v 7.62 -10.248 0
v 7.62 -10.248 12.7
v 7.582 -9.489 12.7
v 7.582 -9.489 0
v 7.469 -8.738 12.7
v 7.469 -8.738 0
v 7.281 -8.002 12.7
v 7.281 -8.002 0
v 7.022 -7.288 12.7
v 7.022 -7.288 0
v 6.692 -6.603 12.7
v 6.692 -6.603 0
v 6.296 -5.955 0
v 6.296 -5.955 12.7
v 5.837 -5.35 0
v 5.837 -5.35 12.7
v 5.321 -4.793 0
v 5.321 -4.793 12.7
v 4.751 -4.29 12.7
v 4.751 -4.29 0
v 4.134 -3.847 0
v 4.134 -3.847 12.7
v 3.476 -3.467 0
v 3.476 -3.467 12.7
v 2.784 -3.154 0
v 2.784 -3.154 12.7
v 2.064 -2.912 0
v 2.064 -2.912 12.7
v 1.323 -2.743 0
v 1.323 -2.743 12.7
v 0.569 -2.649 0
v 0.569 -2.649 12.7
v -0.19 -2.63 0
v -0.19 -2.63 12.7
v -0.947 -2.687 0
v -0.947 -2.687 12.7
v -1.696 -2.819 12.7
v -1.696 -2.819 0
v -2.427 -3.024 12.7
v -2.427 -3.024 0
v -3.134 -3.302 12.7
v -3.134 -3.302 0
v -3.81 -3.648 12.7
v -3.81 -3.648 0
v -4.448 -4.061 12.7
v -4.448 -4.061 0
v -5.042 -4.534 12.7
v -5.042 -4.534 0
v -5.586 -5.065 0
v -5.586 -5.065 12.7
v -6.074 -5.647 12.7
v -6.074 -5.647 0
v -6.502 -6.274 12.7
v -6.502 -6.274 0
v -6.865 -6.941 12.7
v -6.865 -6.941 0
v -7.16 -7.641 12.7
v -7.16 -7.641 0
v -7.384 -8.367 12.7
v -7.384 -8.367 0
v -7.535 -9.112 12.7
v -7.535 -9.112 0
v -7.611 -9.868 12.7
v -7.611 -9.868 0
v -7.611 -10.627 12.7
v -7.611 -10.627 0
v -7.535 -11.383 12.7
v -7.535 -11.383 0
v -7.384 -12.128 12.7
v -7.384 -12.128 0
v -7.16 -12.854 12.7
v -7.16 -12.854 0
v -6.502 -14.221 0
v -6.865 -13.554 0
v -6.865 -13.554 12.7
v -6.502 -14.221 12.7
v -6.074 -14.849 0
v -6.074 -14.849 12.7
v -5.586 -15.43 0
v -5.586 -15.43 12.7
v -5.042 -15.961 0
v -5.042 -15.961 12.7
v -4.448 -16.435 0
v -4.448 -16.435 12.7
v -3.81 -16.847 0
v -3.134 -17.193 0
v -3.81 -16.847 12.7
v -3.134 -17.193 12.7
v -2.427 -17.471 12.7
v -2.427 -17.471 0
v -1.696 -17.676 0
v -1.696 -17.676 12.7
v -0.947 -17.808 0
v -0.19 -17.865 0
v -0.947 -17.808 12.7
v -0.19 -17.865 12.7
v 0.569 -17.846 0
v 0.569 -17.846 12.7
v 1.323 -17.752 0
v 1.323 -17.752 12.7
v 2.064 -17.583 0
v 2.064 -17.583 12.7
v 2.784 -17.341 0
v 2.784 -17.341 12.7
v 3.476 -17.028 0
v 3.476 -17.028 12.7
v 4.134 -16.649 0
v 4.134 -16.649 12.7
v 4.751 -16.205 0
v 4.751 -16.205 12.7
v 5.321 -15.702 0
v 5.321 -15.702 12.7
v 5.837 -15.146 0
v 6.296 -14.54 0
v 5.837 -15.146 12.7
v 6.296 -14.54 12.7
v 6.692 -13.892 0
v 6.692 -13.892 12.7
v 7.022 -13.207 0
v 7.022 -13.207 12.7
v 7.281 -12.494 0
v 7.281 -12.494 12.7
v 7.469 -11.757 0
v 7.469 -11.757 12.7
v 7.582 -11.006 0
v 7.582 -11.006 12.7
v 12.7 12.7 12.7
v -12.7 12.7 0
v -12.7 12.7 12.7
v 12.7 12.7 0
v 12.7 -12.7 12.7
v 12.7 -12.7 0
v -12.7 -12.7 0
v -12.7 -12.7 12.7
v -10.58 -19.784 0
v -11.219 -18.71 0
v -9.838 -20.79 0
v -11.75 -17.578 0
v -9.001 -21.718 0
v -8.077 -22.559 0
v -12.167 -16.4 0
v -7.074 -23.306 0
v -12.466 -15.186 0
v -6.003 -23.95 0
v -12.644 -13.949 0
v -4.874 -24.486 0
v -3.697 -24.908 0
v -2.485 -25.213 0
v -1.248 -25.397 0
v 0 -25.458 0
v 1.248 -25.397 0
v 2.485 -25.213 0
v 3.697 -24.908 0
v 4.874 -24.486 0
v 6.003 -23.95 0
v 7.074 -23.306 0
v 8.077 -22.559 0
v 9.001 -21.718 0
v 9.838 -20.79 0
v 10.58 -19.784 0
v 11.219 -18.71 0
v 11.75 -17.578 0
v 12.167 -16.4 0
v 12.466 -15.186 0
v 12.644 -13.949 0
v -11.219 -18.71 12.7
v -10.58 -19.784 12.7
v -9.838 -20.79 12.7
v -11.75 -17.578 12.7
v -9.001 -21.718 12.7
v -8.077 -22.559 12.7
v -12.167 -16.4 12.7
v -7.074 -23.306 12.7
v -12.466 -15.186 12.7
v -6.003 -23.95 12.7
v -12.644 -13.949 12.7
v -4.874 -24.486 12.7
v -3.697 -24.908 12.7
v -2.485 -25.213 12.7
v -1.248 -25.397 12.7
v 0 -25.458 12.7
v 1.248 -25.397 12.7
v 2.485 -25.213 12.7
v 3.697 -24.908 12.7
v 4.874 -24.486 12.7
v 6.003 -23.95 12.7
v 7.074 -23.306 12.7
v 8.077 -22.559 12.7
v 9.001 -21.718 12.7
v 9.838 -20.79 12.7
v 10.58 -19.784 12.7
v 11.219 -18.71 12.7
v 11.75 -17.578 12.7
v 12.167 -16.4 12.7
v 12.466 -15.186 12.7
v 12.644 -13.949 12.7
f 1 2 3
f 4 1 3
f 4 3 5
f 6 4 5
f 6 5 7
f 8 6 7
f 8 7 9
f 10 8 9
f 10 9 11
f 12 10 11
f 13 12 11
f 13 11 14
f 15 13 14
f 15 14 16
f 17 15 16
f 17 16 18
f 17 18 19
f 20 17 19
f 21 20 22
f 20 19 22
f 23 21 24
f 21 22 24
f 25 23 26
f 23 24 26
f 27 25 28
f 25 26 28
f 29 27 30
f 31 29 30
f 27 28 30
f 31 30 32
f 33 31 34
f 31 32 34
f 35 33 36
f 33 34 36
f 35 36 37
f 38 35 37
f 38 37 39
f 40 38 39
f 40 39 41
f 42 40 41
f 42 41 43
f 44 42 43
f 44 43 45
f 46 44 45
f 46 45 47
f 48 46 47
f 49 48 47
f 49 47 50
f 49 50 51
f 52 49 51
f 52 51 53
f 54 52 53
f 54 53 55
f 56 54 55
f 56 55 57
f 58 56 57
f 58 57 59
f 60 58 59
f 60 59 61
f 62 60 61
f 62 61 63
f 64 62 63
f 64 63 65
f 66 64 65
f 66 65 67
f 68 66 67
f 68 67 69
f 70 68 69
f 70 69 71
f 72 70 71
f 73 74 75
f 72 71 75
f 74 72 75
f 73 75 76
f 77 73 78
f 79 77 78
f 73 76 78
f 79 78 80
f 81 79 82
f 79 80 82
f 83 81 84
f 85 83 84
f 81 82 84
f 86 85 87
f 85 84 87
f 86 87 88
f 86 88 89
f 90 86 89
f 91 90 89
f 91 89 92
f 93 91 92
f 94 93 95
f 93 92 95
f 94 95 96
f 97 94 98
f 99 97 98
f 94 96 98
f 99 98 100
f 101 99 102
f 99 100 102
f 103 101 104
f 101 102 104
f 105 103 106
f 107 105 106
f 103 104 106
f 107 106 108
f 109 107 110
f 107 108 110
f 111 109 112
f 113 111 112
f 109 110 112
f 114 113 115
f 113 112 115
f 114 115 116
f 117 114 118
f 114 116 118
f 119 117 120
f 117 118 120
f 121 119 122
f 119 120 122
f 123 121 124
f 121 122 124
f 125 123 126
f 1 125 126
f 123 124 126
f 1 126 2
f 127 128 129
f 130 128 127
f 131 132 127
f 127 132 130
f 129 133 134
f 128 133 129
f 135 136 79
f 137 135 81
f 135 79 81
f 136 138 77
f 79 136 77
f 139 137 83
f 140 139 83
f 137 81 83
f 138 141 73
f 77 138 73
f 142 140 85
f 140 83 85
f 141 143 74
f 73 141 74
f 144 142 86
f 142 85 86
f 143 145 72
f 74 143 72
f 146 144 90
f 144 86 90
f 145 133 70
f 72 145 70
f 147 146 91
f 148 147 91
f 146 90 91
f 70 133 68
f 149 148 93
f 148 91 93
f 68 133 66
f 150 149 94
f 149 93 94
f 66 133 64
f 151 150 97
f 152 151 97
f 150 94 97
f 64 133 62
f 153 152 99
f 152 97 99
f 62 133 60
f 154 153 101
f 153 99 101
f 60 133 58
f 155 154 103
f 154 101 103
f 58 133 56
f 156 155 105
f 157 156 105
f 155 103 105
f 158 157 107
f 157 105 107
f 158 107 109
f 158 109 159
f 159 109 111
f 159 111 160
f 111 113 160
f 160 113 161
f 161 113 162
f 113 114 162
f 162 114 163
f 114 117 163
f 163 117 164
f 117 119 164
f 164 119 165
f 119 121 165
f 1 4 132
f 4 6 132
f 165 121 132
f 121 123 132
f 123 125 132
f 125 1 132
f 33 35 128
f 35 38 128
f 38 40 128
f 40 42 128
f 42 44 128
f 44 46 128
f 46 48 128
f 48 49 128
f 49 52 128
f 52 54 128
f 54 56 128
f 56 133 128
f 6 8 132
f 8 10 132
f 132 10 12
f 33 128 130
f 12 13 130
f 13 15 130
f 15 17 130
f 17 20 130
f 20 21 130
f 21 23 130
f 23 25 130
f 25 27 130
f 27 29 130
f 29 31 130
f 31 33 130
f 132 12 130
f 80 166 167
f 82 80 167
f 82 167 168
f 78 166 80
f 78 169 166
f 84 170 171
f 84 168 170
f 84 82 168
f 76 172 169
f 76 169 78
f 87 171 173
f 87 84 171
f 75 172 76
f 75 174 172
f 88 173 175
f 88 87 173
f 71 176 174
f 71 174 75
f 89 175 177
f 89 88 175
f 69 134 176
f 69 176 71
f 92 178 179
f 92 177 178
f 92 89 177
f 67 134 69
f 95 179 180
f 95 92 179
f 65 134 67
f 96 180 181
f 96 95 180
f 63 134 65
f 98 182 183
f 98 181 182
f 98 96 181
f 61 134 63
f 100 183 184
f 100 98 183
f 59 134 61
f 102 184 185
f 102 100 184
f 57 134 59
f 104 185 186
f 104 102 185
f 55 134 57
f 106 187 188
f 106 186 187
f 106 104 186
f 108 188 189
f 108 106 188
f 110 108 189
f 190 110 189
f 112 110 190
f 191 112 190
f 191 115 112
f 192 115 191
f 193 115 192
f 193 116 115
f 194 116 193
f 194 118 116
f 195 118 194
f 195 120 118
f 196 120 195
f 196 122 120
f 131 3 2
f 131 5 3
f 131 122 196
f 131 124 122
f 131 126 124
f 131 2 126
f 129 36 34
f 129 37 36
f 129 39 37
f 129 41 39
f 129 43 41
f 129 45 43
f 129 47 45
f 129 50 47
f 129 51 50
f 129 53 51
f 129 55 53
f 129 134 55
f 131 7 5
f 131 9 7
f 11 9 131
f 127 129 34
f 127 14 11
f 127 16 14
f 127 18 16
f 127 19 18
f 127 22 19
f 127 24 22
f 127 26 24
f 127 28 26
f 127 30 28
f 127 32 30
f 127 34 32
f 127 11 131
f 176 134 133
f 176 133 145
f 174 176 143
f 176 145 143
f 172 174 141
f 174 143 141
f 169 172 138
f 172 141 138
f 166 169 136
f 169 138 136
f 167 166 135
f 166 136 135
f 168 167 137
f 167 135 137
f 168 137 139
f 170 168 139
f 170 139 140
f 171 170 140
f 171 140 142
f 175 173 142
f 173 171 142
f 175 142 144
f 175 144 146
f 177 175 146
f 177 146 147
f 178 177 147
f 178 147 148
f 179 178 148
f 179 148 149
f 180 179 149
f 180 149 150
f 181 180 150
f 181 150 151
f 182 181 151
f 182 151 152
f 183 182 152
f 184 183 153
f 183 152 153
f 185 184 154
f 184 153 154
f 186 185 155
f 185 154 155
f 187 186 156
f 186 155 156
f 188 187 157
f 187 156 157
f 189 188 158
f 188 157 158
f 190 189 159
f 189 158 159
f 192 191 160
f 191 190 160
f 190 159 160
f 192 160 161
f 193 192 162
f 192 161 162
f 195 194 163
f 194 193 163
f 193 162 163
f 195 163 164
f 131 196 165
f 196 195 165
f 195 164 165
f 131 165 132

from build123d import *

# Parameters (mm, degrees)
F0_W     = 25.4
F0_H     = 25.4
F1_DEPTH = 12.7
F2_R     = 12.7
F3_DEPTH = 12.7
F4_R     = 7.62
F5_DEPTH = 12.701


with BuildPart() as f1:
    # F0 (on Top) → F1 (new body)
    with BuildSketch(Plane.XY):
        Rectangle(F0_W, F0_H)
    extrude(amount=F1_DEPTH)

    # F2 (on Top) → F3 (join)
    with BuildSketch(Plane.XY):
        with Locations((0, -12.758351)):
            Circle(F2_R)
    extrude(amount=F3_DEPTH)

    # F4 (on face) → F5 (cut, through all)
    with BuildSketch(Plane.XY.offset(12.7)):
        with Locations((0, -10.247545)):
            Circle(F4_R)
    extrude(amount=-F5_DEPTH, mode=Mode.SUBTRACT)


solid = f1.part
